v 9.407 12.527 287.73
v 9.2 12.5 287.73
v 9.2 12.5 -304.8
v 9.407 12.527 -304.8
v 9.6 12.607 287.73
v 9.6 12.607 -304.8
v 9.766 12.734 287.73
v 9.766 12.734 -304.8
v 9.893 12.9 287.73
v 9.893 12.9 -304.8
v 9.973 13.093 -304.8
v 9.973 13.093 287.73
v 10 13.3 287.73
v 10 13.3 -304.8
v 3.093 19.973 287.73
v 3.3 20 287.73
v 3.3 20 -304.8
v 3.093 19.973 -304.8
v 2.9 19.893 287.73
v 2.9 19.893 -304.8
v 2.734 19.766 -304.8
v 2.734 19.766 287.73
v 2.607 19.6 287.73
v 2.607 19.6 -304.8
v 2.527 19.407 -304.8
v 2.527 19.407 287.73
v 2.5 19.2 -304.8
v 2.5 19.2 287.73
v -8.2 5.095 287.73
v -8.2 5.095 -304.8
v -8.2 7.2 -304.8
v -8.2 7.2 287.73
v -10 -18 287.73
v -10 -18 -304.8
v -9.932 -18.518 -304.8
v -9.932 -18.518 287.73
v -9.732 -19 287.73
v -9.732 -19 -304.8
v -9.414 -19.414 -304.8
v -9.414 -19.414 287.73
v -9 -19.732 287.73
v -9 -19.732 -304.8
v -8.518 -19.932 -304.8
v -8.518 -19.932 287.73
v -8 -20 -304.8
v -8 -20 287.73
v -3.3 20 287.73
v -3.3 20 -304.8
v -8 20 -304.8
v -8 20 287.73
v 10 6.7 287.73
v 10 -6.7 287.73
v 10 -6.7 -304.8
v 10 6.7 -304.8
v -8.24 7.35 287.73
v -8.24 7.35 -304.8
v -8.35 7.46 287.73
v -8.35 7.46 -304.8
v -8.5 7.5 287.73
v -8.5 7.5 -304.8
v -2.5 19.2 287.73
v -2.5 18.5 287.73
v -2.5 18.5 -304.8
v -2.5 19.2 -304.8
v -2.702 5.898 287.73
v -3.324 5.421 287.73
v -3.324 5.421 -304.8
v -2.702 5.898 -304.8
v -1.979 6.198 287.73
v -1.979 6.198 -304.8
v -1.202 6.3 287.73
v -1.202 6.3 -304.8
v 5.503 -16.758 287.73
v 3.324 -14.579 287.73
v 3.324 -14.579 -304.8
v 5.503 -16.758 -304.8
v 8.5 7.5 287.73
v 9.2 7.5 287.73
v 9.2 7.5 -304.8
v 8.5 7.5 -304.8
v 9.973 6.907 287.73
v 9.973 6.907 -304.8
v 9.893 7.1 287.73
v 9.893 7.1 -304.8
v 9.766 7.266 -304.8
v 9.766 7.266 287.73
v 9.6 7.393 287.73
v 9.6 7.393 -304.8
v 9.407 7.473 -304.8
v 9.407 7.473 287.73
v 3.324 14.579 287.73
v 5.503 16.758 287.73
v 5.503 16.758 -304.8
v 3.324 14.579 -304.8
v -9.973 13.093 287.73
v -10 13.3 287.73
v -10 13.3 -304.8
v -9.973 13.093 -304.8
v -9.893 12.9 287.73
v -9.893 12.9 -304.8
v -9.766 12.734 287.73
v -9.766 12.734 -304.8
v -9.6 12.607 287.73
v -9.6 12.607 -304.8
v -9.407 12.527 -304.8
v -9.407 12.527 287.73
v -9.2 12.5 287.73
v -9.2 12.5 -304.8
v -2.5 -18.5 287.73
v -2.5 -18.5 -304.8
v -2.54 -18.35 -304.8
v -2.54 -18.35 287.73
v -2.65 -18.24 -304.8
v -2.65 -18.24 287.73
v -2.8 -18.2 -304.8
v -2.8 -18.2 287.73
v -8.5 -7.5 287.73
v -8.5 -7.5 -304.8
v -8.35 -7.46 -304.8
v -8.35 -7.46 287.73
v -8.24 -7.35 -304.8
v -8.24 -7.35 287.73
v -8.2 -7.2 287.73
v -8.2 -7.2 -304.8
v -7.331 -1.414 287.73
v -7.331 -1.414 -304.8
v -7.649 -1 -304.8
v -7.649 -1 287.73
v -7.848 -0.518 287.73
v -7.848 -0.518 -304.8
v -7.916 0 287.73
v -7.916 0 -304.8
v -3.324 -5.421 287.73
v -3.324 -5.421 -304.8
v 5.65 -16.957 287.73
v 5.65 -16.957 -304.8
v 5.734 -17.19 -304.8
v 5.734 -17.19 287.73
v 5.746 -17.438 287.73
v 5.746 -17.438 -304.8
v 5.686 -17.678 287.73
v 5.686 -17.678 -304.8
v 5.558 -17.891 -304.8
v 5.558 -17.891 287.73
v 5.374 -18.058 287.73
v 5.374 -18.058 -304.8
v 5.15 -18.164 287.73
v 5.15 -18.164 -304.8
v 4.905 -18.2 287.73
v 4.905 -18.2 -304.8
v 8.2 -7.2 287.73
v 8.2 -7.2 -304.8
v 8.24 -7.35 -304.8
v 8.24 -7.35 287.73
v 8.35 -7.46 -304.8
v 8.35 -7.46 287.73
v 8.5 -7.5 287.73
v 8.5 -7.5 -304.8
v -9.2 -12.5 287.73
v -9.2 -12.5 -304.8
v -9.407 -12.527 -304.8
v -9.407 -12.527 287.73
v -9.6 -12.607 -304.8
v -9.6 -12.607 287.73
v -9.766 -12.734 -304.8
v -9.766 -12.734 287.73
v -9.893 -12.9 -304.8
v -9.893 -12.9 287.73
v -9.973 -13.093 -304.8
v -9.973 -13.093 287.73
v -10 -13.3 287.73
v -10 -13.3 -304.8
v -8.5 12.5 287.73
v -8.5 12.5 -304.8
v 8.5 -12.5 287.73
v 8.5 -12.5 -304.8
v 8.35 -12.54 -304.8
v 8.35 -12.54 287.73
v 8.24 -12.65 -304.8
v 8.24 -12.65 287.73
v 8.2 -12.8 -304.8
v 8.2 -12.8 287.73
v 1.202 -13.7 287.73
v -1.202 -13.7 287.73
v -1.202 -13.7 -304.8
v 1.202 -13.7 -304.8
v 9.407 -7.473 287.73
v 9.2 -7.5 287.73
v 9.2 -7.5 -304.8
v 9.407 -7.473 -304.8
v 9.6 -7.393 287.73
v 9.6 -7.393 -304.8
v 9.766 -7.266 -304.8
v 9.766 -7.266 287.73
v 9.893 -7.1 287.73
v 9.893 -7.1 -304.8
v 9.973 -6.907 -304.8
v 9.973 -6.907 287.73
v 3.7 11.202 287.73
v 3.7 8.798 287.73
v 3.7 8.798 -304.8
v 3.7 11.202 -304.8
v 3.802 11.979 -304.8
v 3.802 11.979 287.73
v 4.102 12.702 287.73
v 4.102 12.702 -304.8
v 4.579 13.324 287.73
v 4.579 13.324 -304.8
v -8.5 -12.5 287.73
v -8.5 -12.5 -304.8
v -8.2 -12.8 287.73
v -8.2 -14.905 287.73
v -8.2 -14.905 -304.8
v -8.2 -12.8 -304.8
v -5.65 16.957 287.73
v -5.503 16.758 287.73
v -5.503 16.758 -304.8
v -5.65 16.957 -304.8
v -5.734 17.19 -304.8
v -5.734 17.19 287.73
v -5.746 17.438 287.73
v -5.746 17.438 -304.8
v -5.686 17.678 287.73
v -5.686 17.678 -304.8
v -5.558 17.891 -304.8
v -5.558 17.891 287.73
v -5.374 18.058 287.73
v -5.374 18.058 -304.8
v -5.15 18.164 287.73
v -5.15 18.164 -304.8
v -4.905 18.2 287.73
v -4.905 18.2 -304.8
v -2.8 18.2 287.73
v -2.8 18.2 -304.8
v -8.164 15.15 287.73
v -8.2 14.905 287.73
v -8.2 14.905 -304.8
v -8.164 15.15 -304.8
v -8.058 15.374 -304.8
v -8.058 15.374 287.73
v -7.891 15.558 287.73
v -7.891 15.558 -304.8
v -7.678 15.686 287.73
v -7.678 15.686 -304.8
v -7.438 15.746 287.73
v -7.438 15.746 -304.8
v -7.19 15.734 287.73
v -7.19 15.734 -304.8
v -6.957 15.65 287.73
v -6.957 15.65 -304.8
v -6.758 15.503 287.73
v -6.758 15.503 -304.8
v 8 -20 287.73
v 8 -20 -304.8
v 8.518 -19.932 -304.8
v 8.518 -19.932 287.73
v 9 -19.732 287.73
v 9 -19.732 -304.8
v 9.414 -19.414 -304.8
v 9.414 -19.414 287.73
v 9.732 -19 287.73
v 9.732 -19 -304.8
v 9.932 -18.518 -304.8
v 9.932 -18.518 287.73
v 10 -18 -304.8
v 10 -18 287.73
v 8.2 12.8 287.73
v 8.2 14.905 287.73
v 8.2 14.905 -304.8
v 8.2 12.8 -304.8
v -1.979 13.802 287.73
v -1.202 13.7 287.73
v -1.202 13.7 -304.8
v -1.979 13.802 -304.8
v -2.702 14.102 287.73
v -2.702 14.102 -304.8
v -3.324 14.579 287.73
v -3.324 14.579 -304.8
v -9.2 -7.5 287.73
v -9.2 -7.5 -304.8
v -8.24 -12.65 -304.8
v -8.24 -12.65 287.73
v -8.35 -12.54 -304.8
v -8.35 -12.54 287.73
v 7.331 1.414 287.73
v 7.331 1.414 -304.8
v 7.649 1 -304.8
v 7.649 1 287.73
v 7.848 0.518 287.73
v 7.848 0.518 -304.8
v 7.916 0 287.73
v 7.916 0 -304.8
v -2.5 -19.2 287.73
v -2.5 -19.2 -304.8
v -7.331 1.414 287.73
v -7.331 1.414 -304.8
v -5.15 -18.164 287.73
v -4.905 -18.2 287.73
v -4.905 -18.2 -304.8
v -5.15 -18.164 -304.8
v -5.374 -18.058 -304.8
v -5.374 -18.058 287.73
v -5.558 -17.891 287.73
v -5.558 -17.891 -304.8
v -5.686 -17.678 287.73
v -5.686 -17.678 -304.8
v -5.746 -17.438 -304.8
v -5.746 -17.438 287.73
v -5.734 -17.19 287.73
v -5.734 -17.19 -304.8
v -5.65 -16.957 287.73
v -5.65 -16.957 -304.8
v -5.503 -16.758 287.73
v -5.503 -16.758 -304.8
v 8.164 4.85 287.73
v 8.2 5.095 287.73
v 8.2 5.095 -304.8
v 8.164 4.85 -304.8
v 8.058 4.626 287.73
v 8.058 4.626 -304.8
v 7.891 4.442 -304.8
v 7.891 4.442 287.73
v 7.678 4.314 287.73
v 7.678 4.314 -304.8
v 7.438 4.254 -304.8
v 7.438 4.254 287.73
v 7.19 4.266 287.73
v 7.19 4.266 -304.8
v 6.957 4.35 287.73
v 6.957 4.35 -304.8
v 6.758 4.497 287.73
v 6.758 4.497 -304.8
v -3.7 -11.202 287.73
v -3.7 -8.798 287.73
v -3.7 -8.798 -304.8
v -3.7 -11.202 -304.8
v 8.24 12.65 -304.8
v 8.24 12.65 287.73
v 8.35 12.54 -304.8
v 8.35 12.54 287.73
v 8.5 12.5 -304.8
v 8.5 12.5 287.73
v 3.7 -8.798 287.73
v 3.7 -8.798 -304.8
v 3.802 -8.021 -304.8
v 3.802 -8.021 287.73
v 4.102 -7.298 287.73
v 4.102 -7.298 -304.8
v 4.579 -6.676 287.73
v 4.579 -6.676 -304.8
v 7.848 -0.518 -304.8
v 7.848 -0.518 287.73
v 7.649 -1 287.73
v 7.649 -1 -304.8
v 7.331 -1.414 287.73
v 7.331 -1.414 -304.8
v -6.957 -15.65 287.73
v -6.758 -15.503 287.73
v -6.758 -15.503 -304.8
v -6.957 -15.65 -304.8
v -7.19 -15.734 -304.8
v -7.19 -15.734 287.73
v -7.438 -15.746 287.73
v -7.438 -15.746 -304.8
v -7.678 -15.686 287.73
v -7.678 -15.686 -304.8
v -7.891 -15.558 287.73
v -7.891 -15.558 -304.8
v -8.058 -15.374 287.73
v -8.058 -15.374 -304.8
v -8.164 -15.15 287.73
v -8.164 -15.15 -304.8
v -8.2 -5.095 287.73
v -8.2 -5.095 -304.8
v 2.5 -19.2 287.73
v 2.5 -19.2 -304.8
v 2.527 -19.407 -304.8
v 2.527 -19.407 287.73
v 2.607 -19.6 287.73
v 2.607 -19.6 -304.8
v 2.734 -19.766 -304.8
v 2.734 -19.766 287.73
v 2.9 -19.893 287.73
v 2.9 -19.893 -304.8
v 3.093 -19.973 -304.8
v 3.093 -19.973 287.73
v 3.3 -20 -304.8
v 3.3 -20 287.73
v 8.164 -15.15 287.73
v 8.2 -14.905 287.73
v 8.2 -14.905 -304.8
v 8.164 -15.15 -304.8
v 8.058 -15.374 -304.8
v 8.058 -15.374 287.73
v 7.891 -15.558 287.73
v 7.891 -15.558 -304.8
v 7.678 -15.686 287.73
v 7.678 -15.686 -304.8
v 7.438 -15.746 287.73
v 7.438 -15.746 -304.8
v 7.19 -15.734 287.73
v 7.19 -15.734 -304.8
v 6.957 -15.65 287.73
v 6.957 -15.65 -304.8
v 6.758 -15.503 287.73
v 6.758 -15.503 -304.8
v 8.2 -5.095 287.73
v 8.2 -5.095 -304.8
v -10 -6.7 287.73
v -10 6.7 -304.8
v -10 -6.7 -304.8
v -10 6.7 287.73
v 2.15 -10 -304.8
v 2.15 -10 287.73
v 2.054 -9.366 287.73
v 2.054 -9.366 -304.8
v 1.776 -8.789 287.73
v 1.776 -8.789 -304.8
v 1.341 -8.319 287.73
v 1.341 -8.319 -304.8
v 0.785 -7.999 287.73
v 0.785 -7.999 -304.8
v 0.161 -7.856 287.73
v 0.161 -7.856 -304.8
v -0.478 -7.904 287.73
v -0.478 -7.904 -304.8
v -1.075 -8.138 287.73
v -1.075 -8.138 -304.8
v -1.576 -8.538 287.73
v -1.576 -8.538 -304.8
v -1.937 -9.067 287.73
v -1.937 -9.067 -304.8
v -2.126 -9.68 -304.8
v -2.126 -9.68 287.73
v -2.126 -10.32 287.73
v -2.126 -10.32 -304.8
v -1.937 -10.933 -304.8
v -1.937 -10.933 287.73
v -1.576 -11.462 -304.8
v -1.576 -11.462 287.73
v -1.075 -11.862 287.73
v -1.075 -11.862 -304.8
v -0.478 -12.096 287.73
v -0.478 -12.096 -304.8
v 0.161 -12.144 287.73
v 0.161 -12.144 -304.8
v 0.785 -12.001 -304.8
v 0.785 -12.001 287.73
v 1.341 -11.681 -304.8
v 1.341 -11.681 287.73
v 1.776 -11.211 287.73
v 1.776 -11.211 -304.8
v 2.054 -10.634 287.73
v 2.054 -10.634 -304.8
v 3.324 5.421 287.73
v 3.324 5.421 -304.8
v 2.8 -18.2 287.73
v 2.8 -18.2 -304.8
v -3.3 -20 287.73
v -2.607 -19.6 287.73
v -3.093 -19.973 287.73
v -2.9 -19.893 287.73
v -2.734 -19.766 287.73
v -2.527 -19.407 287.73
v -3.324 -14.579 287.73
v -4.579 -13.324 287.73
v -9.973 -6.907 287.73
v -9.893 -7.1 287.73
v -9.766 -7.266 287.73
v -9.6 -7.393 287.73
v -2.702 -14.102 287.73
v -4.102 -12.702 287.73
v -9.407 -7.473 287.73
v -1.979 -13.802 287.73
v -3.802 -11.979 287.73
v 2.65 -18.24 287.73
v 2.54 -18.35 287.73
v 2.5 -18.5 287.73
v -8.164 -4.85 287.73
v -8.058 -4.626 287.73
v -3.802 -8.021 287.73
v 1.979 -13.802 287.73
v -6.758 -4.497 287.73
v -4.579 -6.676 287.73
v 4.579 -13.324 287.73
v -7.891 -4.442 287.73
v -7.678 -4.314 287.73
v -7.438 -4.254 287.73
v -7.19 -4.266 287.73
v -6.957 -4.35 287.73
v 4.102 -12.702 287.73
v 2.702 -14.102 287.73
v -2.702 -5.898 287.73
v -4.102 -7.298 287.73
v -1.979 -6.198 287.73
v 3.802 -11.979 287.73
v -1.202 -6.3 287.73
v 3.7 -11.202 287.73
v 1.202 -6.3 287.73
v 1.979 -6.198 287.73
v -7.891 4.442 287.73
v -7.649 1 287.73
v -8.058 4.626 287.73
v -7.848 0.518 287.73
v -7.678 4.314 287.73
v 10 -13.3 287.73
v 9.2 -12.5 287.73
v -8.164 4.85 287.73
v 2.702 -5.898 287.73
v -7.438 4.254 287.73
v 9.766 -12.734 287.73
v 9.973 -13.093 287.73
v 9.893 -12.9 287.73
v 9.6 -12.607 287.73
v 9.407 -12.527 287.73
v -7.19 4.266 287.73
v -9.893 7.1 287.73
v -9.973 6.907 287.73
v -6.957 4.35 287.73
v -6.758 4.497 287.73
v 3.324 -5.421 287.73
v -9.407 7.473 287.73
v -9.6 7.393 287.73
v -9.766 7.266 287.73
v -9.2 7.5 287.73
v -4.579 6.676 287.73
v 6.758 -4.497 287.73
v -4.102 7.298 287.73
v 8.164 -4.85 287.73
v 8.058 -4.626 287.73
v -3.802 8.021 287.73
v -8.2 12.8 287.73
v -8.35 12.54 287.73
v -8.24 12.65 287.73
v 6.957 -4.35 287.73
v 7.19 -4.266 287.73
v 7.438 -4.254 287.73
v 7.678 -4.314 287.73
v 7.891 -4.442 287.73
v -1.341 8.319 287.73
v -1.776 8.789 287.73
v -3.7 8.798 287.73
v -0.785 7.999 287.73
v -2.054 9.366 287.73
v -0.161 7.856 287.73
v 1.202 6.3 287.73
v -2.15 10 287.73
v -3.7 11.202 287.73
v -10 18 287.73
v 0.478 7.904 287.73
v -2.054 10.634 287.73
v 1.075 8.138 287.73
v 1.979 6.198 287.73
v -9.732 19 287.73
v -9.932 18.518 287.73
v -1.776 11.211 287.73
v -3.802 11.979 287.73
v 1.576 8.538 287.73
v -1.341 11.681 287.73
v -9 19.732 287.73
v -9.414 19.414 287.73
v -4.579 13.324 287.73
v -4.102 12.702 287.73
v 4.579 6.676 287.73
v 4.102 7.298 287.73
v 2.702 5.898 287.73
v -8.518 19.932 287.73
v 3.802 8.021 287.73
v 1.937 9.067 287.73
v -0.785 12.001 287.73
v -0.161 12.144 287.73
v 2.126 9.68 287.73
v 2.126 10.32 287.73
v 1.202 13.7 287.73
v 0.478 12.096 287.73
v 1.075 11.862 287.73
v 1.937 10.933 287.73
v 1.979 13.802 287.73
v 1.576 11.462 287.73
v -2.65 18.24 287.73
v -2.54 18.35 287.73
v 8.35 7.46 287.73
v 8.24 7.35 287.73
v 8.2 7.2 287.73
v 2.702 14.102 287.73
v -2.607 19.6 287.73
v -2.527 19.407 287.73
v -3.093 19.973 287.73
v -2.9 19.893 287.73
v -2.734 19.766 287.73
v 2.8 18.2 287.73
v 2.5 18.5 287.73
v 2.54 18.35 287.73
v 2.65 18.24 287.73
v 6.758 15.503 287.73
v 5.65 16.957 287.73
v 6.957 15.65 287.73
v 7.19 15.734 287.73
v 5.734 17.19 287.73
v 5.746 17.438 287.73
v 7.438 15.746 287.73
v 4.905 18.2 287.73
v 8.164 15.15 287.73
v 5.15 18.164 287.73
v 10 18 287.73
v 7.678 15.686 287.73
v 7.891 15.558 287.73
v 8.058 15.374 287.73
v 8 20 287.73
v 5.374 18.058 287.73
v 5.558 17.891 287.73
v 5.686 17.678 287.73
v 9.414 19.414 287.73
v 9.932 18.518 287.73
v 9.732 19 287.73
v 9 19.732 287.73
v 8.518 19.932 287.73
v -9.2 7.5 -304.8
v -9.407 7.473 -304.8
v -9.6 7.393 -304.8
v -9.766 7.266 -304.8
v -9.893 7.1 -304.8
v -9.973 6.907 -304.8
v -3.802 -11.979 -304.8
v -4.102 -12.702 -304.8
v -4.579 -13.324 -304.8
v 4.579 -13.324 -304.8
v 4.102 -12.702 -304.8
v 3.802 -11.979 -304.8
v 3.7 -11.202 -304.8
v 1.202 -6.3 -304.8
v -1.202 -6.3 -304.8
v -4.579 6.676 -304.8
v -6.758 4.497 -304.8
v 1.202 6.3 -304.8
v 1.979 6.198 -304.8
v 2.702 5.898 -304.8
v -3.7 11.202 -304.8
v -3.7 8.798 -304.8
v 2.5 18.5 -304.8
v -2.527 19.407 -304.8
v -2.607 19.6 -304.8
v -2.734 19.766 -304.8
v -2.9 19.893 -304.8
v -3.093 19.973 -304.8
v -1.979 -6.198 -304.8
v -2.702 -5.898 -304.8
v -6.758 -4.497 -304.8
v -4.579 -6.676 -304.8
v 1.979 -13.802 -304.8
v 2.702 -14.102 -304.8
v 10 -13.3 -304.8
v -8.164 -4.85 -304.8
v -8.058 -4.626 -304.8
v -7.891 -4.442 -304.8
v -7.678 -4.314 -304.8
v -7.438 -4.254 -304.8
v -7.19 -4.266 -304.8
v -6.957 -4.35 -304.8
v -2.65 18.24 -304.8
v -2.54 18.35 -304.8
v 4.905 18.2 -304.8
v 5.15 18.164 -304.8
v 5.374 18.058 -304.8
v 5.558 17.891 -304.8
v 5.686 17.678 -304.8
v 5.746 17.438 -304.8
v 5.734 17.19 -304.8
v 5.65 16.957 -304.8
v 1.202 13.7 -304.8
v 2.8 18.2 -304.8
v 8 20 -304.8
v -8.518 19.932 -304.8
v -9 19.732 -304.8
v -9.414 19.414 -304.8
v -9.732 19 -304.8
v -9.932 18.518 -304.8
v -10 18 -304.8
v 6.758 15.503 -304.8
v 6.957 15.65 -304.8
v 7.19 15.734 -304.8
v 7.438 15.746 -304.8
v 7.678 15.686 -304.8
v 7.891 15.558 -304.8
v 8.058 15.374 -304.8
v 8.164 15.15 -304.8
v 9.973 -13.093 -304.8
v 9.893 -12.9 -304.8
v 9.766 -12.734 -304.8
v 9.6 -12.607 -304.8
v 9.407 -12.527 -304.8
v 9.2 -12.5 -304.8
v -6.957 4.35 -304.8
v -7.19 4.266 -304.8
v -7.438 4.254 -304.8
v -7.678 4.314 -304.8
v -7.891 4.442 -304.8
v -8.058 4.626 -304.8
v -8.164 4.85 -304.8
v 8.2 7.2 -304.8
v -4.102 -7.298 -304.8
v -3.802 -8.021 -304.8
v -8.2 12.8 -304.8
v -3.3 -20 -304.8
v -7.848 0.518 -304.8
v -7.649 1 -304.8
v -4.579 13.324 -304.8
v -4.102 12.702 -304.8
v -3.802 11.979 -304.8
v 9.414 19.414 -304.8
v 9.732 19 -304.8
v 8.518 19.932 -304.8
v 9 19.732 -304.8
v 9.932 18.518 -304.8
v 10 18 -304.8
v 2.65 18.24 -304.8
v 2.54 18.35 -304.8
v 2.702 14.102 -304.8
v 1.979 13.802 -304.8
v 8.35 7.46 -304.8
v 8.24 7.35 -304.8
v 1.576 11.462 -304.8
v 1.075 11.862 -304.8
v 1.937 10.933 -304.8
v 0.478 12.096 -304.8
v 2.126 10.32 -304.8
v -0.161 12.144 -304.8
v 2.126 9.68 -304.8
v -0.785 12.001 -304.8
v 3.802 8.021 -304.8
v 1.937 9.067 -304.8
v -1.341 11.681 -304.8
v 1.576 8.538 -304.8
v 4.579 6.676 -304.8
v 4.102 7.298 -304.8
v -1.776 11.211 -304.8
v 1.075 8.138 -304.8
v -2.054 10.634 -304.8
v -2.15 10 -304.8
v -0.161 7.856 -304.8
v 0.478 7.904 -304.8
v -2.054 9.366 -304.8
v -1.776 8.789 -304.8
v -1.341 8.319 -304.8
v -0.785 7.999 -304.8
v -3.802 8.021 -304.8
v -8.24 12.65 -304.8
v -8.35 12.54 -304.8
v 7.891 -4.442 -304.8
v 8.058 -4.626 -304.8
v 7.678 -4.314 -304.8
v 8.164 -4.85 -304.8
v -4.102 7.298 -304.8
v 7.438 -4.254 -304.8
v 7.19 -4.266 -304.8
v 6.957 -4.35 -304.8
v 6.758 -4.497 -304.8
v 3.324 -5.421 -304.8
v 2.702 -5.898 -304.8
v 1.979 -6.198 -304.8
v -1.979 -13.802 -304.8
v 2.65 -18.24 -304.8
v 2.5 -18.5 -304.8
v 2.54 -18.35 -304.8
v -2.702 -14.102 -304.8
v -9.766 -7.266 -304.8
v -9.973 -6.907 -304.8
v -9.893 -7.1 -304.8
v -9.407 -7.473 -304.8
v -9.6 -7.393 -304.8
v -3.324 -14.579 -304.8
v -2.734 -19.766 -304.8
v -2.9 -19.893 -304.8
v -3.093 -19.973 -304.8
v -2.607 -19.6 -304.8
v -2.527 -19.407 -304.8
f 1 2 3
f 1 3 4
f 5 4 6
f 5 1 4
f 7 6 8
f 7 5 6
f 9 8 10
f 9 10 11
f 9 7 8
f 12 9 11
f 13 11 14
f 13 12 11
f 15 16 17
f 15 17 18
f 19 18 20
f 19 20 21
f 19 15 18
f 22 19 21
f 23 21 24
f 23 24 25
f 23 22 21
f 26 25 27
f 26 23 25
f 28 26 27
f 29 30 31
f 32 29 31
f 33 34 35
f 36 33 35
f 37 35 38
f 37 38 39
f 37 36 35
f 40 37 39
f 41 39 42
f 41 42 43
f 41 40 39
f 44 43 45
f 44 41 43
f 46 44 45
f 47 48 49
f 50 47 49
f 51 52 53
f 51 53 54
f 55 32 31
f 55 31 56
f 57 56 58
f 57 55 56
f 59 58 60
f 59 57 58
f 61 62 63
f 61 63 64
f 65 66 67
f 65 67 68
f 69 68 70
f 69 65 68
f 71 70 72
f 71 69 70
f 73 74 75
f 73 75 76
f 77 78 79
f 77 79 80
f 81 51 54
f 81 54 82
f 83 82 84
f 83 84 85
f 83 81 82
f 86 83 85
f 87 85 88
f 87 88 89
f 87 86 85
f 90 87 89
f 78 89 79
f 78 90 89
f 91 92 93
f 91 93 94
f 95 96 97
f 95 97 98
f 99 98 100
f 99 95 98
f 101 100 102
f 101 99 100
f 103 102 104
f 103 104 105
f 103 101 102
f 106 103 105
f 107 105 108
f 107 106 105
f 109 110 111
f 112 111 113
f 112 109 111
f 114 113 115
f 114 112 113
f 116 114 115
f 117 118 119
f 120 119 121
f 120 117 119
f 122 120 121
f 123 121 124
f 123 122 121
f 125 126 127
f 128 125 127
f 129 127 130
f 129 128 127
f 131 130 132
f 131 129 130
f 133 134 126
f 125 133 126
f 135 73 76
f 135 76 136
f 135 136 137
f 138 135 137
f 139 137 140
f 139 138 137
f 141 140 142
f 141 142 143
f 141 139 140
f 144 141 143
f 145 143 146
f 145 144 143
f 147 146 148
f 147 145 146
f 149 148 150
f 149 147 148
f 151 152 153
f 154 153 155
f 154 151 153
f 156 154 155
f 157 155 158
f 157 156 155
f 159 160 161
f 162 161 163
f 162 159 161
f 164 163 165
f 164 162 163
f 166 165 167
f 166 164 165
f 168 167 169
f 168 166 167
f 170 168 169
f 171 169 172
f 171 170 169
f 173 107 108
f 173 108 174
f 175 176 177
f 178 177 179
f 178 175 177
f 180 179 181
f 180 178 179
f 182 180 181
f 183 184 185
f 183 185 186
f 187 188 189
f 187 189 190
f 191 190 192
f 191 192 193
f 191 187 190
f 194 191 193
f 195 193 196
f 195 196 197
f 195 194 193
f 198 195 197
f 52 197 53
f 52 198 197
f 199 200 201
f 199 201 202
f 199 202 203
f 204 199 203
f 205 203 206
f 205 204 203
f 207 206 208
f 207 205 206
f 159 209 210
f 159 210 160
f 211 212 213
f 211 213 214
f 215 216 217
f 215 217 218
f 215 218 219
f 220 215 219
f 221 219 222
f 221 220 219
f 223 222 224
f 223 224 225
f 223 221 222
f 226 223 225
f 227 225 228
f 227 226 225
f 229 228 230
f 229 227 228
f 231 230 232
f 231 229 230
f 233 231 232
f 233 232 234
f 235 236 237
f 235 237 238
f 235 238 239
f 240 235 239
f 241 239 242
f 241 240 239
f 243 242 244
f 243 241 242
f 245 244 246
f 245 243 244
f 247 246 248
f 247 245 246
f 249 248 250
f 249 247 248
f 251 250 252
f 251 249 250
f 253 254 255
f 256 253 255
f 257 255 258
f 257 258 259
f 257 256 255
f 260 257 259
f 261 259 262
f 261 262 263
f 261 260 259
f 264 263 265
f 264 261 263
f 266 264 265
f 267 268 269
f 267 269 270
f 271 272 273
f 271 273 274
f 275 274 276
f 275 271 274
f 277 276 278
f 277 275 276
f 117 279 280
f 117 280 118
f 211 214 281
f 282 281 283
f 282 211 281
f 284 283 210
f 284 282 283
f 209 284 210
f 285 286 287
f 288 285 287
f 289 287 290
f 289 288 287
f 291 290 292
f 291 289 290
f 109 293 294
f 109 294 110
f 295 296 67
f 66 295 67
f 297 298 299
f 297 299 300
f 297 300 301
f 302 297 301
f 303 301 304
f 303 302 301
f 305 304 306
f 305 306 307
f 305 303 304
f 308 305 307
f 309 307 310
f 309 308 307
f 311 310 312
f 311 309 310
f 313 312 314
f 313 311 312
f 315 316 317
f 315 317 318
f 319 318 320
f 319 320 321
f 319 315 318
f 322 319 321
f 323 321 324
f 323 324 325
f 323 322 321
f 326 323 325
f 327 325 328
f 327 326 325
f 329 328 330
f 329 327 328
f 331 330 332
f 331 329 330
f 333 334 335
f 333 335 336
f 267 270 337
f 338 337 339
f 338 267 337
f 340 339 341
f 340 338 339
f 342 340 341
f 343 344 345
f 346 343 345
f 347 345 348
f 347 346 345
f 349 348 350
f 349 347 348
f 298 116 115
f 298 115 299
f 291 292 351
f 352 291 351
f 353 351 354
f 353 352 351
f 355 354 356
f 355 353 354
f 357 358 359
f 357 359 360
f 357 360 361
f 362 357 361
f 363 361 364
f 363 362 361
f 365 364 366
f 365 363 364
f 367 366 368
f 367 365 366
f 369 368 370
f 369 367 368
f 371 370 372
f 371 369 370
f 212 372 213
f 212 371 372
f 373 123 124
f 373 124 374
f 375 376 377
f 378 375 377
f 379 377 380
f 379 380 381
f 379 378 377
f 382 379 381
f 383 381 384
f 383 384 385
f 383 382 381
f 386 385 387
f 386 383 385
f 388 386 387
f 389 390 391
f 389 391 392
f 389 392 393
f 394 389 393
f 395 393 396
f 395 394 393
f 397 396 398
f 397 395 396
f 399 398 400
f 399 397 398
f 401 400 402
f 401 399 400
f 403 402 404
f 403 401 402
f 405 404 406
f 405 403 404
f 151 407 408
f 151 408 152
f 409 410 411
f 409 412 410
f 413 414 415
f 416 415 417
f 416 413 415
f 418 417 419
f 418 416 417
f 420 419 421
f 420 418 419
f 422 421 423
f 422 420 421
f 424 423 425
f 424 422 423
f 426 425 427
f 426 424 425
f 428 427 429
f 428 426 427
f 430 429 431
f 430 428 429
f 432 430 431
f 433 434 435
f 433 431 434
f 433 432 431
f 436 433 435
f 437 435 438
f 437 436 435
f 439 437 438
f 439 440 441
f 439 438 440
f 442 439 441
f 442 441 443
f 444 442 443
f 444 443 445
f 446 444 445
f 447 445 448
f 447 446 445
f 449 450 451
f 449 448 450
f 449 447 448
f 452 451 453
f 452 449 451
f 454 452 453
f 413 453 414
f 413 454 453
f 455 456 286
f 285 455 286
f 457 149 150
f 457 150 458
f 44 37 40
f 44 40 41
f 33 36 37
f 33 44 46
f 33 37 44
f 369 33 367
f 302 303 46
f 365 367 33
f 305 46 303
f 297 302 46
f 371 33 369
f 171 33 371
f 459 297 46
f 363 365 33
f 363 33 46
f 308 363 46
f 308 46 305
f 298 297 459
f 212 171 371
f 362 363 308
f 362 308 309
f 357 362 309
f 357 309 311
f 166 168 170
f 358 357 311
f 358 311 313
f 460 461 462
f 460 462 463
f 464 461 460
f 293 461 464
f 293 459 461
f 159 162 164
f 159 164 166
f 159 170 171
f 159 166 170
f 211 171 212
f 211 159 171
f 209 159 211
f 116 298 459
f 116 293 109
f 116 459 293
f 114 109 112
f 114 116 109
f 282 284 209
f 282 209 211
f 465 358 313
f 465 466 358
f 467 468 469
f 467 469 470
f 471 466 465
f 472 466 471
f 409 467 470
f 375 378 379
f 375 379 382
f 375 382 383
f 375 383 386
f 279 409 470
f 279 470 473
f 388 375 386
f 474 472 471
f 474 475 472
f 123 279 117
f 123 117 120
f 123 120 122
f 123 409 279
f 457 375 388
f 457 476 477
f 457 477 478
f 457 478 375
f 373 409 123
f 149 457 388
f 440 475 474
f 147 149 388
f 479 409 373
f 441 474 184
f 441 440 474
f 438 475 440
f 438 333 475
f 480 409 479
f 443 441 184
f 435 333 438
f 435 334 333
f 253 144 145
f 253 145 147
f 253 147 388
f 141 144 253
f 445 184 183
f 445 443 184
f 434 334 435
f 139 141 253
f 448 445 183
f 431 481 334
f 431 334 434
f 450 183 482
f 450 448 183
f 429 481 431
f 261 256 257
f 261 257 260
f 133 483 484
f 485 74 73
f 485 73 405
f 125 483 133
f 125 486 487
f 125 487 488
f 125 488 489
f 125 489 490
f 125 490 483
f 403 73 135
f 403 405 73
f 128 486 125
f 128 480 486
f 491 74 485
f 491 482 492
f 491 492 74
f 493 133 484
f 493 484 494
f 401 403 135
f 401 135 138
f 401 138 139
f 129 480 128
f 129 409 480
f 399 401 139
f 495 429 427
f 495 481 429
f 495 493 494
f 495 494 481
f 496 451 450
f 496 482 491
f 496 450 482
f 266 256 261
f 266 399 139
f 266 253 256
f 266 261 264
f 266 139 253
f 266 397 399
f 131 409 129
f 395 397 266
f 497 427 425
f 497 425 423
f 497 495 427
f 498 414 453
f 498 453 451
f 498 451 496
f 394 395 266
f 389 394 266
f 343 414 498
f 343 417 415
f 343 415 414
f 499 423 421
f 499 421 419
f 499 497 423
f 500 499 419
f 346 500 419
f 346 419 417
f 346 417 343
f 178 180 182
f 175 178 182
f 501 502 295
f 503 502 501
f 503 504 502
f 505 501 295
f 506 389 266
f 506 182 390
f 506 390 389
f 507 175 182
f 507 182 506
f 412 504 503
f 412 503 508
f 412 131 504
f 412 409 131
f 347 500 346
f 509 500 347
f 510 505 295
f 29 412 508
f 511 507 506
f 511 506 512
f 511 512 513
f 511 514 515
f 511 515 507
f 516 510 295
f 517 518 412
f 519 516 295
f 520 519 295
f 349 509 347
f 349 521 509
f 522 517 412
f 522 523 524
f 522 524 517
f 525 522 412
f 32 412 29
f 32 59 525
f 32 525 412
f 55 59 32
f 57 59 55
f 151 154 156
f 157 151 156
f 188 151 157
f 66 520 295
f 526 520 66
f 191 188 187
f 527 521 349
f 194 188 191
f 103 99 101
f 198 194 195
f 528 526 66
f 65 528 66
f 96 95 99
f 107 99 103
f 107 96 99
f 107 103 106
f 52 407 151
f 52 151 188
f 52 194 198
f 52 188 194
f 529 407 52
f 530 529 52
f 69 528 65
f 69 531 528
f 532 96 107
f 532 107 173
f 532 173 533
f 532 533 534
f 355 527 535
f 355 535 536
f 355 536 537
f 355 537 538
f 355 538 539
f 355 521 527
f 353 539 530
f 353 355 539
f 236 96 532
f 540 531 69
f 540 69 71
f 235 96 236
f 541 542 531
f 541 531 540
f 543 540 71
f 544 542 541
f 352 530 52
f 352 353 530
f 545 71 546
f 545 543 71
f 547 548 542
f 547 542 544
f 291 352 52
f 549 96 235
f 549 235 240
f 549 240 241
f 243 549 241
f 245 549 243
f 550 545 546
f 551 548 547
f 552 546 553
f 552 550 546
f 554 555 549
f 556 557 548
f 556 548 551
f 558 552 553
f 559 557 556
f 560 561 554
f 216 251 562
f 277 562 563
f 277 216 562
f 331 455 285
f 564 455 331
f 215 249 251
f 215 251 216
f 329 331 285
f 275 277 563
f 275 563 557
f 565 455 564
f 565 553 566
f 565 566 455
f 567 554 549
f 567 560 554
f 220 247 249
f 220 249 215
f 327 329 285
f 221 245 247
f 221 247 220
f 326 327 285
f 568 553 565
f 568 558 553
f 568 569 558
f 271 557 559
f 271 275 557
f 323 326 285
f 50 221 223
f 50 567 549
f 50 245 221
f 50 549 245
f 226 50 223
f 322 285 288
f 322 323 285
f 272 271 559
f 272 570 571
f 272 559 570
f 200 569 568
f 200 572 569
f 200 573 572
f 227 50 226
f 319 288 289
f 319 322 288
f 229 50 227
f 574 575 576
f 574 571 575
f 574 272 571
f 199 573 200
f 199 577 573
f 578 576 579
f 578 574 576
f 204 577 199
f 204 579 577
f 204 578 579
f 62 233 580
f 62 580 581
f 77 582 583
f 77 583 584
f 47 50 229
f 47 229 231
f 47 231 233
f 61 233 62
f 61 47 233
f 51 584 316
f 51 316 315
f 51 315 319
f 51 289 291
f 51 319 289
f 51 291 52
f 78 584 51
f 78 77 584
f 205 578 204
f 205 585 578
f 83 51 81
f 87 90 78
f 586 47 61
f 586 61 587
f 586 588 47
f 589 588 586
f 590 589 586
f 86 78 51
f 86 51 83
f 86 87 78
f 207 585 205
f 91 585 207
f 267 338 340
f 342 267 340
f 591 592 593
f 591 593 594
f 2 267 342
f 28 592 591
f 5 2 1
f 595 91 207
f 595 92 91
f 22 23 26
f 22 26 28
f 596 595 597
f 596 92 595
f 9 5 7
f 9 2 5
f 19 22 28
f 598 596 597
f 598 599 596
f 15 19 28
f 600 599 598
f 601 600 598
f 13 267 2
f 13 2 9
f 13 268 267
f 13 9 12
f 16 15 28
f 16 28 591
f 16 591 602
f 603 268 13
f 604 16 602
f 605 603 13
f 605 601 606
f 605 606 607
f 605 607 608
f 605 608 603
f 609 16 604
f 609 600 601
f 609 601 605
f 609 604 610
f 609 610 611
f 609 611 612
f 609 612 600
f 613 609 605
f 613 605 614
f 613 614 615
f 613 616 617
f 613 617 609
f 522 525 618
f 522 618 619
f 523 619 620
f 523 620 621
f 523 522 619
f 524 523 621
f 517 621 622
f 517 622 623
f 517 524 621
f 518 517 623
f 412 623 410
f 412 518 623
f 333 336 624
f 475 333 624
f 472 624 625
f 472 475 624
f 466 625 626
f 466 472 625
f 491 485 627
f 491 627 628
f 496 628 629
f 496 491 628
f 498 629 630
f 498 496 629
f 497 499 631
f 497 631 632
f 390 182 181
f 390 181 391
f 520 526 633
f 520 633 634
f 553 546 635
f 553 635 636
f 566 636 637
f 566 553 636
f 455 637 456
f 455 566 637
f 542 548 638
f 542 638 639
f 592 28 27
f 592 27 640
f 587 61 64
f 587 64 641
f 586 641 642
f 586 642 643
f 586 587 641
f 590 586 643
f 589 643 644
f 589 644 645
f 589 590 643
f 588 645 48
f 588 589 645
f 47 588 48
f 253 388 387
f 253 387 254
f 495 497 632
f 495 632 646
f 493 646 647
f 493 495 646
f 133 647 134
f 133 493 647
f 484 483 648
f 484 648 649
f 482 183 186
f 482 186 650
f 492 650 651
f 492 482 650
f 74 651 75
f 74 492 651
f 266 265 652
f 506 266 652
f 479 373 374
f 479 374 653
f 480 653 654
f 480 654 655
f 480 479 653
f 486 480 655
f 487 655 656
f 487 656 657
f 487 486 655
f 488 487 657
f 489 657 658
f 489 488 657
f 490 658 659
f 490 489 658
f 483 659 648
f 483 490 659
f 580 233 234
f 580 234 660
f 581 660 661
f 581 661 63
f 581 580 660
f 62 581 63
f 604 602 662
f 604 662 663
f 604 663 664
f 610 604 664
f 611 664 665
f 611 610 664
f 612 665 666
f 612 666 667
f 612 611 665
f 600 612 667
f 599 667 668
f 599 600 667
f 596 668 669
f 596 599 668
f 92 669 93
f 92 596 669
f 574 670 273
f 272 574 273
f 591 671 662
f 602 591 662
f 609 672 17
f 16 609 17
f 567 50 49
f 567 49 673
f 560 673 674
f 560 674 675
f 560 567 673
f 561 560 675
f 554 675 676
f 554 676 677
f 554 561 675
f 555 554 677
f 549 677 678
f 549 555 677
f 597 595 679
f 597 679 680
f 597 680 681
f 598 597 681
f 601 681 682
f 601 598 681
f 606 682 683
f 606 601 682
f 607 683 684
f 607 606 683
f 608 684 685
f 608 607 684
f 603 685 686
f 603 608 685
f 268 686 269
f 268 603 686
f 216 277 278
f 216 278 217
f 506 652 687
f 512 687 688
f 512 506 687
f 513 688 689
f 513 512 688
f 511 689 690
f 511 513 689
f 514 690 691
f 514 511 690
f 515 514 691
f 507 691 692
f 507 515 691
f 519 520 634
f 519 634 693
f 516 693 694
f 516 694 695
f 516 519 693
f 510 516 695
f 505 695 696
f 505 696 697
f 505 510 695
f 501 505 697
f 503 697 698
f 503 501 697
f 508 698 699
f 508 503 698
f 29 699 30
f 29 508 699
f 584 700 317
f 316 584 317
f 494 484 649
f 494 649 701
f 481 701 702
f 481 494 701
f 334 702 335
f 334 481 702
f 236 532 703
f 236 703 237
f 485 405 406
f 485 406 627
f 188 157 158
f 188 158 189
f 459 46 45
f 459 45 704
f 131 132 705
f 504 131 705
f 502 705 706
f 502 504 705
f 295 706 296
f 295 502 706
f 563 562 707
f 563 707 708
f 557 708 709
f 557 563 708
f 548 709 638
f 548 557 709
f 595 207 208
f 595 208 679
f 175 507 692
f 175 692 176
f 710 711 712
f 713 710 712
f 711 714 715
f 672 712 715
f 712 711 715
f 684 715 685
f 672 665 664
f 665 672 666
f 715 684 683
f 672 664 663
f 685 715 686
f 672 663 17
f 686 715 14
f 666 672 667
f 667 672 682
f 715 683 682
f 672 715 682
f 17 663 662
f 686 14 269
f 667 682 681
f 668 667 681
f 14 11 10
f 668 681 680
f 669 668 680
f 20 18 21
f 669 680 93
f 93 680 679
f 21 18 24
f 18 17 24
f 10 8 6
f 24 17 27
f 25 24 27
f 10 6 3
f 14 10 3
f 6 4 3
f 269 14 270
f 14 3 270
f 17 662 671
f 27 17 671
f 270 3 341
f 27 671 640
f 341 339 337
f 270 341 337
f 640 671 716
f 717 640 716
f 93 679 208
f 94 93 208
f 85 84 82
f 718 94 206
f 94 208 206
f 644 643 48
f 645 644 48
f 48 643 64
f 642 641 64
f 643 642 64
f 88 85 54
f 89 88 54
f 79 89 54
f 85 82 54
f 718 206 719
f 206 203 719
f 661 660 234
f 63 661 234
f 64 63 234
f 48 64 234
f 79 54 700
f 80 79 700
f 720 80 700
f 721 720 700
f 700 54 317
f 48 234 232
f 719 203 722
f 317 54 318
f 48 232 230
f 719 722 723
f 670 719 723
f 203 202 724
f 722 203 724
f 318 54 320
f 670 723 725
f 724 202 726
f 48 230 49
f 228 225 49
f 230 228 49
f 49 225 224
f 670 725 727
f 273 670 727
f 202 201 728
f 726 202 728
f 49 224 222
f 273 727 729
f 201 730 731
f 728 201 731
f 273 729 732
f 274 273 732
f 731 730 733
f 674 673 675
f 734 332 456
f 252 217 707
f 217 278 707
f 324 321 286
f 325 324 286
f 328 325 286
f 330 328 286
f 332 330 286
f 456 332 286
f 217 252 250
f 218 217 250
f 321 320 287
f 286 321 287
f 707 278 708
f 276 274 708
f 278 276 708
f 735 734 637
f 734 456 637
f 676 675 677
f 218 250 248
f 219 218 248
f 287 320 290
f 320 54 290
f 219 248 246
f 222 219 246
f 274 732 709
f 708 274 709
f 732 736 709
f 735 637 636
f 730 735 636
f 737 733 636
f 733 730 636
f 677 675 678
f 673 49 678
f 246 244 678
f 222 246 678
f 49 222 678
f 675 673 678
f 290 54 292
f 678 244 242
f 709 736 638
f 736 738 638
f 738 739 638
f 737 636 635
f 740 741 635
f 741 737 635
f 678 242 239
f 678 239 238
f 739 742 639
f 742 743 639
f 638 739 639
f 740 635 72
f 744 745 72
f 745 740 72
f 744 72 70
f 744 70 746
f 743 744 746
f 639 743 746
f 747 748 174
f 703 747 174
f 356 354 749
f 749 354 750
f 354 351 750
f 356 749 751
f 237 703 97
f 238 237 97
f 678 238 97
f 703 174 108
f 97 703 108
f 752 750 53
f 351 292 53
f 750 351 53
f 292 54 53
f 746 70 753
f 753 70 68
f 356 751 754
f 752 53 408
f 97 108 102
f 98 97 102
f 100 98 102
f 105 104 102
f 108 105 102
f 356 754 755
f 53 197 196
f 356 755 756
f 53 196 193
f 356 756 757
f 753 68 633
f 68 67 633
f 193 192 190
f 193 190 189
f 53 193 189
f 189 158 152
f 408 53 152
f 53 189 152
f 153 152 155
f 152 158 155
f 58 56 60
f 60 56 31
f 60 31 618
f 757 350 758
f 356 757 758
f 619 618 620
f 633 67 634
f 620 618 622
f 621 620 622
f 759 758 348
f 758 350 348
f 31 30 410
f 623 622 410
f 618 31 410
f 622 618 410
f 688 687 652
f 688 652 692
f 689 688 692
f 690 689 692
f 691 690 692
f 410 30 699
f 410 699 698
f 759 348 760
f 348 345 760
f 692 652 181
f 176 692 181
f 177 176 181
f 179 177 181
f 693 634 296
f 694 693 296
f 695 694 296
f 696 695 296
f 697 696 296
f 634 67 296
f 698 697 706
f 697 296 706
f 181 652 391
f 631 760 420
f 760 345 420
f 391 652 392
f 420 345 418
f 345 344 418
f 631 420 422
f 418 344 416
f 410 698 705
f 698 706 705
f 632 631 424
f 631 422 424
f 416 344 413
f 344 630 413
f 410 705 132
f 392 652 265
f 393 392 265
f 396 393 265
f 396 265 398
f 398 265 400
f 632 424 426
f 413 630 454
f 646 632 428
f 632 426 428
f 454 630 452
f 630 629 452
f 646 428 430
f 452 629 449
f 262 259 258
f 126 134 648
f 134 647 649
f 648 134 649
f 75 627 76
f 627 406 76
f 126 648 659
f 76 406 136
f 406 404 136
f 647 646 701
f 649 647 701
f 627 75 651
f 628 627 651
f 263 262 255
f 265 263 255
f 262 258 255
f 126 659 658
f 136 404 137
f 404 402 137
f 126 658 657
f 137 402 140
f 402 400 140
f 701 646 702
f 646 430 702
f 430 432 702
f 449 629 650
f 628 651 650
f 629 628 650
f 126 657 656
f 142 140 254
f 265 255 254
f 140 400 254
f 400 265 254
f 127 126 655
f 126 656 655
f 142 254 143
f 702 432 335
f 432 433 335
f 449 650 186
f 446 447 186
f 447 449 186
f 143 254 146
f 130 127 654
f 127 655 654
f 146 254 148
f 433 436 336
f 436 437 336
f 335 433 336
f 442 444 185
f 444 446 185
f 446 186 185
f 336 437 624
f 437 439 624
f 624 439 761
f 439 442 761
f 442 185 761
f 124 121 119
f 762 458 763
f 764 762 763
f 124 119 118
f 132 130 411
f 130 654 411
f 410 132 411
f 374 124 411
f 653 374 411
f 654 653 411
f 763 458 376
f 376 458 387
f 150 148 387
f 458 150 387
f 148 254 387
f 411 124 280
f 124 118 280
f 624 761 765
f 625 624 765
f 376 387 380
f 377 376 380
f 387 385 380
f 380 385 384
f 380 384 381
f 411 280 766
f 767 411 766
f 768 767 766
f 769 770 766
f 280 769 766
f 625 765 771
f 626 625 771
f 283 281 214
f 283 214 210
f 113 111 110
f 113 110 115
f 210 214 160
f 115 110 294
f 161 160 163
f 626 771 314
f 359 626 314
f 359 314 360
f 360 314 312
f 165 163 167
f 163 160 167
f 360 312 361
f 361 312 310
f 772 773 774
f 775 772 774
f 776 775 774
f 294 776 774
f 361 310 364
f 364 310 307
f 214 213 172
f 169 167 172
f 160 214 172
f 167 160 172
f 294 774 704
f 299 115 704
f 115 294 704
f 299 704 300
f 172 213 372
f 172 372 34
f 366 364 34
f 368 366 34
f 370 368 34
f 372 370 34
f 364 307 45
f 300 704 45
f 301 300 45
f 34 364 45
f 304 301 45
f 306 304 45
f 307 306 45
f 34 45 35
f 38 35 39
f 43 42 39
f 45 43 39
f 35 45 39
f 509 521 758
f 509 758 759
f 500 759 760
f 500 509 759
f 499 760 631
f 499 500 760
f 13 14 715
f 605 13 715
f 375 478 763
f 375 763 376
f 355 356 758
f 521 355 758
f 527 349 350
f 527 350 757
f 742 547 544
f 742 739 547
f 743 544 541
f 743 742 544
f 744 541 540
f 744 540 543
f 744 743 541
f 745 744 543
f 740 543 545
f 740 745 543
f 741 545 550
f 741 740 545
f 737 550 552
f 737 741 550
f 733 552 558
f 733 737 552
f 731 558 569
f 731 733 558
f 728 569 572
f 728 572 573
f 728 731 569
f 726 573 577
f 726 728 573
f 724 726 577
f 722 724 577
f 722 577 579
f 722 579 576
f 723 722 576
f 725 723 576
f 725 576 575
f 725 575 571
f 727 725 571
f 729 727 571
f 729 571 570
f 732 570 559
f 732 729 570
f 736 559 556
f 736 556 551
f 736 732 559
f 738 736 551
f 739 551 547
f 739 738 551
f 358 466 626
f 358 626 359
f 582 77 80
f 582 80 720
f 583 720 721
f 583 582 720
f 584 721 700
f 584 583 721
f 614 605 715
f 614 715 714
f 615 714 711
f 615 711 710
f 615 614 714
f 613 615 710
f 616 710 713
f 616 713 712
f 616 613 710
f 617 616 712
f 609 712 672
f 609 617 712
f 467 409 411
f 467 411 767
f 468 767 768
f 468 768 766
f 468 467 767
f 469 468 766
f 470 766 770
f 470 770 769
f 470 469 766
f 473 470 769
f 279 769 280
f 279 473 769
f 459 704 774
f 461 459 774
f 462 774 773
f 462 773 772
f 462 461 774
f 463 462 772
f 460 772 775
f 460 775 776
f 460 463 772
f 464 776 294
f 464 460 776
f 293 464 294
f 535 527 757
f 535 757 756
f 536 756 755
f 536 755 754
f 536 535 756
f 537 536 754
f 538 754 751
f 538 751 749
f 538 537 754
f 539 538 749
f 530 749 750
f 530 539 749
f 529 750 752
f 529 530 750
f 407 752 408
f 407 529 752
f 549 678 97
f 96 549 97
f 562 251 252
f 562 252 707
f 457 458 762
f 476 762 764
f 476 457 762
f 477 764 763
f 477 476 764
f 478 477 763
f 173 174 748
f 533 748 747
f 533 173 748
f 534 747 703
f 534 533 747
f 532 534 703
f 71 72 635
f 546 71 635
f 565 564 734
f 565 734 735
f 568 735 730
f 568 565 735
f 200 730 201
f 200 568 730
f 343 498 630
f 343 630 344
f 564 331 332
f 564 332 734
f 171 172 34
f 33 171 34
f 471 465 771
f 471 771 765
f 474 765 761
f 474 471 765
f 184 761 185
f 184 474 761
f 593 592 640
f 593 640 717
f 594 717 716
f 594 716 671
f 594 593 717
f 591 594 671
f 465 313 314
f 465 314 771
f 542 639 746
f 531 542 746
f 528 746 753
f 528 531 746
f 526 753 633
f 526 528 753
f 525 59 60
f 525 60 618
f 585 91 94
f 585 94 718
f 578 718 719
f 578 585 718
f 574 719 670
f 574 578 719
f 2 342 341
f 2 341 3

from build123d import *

# Parameters (mm, degrees)
SKETCH3_R           = 2.15
BOSS_EXTRUDE1_DEPTH = 304.8
CIRPATTERN1_COUNT   = 2
SKETCH4_R           = 2.15
CUT_EXTRUDE1_DEPTH  = 17.07


with BuildPart() as part:
    # Sketch3 → Boss-Extrude1 (new, symmetric)
    with BuildSketch(Plane.XY):
        with BuildLine():
            Line((-8.5, 7.5), (-9.2, 7.5))
            ThreePointArc((-9.2, 7.5), (-9.765685425, 7.265685425), (-10, 6.7))
            Line((-10, 6.7), (-10, 0))
            Line((-10, 0), (-7.916458339, 0))
            ThreePointArc((-7.916458339, 0), (-7.764217404, 0.765366865), (-7.330671901, 1.414213562))
            Line((-7.330671901, 1.414213562), (-3.32356512, 5.421320344))
            ThreePointArc((-3.32356512, 5.421320344), (-2.350295073, 6.071638598), (-1.202244776, 6.3))
            Line((-1.202244776, 6.3), (1.202244776, 6.3))
            ThreePointArc((1.202244776, 6.3), (2.350295073, 6.071638598), (3.32356512, 5.421320344))
            Line((3.32356512, 5.421320344), (7.330671901, 1.414213562))
            ThreePointArc((7.330671901, 1.414213562), (7.764217404, 0.765366865), (7.916458339, 0))
            Line((7.916458339, 0), (10, 0))
            Line((10, 0), (10, 6.7))
            ThreePointArc((10, 6.7), (9.765685425, 7.265685425), (9.2, 7.5))
            Line((9.2, 7.5), (8.5, 7.5))
            ThreePointArc((8.5, 7.5), (8.287867966, 7.412132034), (8.2, 7.2))
            Line((8.2, 7.2), (8.2, 5.094911614))
            ThreePointArc((8.2, 5.094911614), (7.678422063, 4.314315067), (6.757645654, 4.497468882))
            Line((6.757645654, 4.497468882), (4.578679656, 6.67643488))
            ThreePointArc((4.578679656, 6.67643488), (3.928361402, 7.649704927), (3.7, 8.797755224))
            Line((3.7, 8.797755224), (3.7, 11.202244776))
            ThreePointArc((3.7, 11.202244776), (3.928361402, 12.350295073), (4.578679656, 13.32356512))
            Line((4.578679656, 13.32356512), (6.757645654, 15.502531118))
            ThreePointArc((6.757645654, 15.502531118), (7.678422063, 15.685684933), (8.2, 14.905088386))
            Line((8.2, 14.905088386), (8.2, 12.8))
            ThreePointArc((8.2, 12.8), (8.287867966, 12.587867966), (8.5, 12.5))
            Line((8.5, 12.5), (9.2, 12.5))
            ThreePointArc((9.2, 12.5), (9.765685425, 12.734314575), (10, 13.3))
            Line((10, 13.3), (10, 18))
            ThreePointArc((10, 18), (9.414213562, 19.414213562), (8, 20))
            Line((8, 20), (3.3, 20))
            ThreePointArc((3.3, 20), (2.734314575, 19.765685425), (2.5, 19.2))
            Line((2.5, 19.2), (2.5, 18.5))
            ThreePointArc((2.5, 18.5), (2.587867966, 18.287867966), (2.8, 18.2))
            Line((2.8, 18.2), (4.905088386, 18.2))
            ThreePointArc((4.905088386, 18.2), (5.685684933, 17.678422063), (5.502531118, 16.757645654))
            Line((5.502531118, 16.757645654), (3.32356512, 14.578679656))
            ThreePointArc((3.32356512, 14.578679656), (2.350295073, 13.928361402), (1.202244776, 13.7))
            Line((1.202244776, 13.7), (-1.202244776, 13.7))
            ThreePointArc((-1.202244776, 13.7), (-2.350295073, 13.928361402), (-3.32356512, 14.578679656))
            Line((-3.32356512, 14.578679656), (-5.502531118, 16.757645654))
            ThreePointArc((-5.502531118, 16.757645654), (-5.685684933, 17.678422063), (-4.905088386, 18.2))
            Line((-4.905088386, 18.2), (-2.8, 18.2))
            ThreePointArc((-2.8, 18.2), (-2.587867966, 18.287867966), (-2.5, 18.5))
            Line((-2.5, 18.5), (-2.5, 19.2))
            ThreePointArc((-2.5, 19.2), (-2.734314575, 19.765685425), (-3.3, 20))
            Line((-3.3, 20), (-8, 20))
            ThreePointArc((-8, 20), (-9.414213562, 19.414213562), (-10, 18))
            Line((-10, 18), (-10, 13.3))
            ThreePointArc((-10, 13.3), (-9.765685425, 12.734314575), (-9.2, 12.5))
            Line((-9.2, 12.5), (-8.5, 12.5))
            ThreePointArc((-8.5, 12.5), (-8.287867966, 12.587867966), (-8.2, 12.8))
            Line((-8.2, 12.8), (-8.2, 14.905088386))
            ThreePointArc((-8.2, 14.905088386), (-7.678422063, 15.685684933), (-6.757645654, 15.502531118))
            Line((-6.757645654, 15.502531118), (-4.578679656, 13.32356512))
            ThreePointArc((-4.578679656, 13.32356512), (-3.928361402, 12.350295073), (-3.7, 11.202244776))
            Line((-3.7, 11.202244776), (-3.7, 8.797755224))
            ThreePointArc((-3.7, 8.797755224), (-3.928361402, 7.649704927), (-4.578679656, 6.67643488))
            Line((-4.578679656, 6.67643488), (-6.757645654, 4.497468882))
            ThreePointArc((-6.757645654, 4.497468882), (-7.678422063, 4.314315067), (-8.2, 5.094911614))
            Line((-8.2, 5.094911614), (-8.2, 7.2))
            ThreePointArc((-8.2, 7.2), (-8.287867966, 7.412132034), (-8.5, 7.5))
        make_face()
        with Locations(Location((0, 10, 0), (0, 0, 180))):
            Circle(SKETCH3_R, mode=Mode.SUBTRACT)
    boss_extrude1 = extrude(amount=BOSS_EXTRUDE1_DEPTH, both=True)

    # CirPattern1: Boss-Extrude1 ×2 about axis
    cirpattern1_axis = Axis((0, 0, 0), (0, 0, 1))
    for i in range(1, CIRPATTERN1_COUNT):
        add(boss_extrude1.rotate(cirpattern1_axis, i * 360 / CIRPATTERN1_COUNT))

    # Sketch4 → Cut-Extrude1 (cut)
    with BuildSketch(Plane.XY.offset(304.8)):
        with BuildLine():
            Line((-2.5, 18.5), (-2.5, 19.2))
            ThreePointArc((-2.5, 19.2), (-2.734314575, 19.765685425), (-3.3, 20))
            Line((-3.3, 20), (-8, 20))
            ThreePointArc((-8, 20), (-9.414213562, 19.414213562), (-10, 18))
            Line((-10, 18), (-10, 13.3))
            ThreePointArc((-10, 13.3), (-9.765685425, 12.734314575), (-9.2, 12.5))
            Line((-9.2, 12.5), (-8.5, 12.5))
            ThreePointArc((-8.5, 12.5), (-8.287867966, 12.587867966), (-8.2, 12.8))
            Line((-8.2, 12.8), (-8.2, 14.905088386))
            ThreePointArc((-8.2, 14.905088386), (-7.678422063, 15.685684933), (-6.757645654, 15.502531118))
            Line((-6.757645654, 15.502531118), (-4.578679656, 13.32356512))
            ThreePointArc((-4.578679656, 13.32356512), (-3.928361402, 12.350295073), (-3.7, 11.202244776))
            Line((-3.7, 11.202244776), (-3.7, 8.797755224))
            ThreePointArc((-3.7, 8.797755224), (-3.928361402, 7.649704927), (-4.578679656, 6.67643488))
            Line((-4.578679656, 6.67643488), (-6.757645654, 4.497468882))
            ThreePointArc((-6.757645654, 4.497468882), (-7.678422063, 4.314315067), (-8.2, 5.094911614))
            Line((-8.2, 5.094911614), (-8.2, 7.2))
            ThreePointArc((-8.2, 7.2), (-8.287867966, 7.412132034), (-8.5, 7.5))
            Line((-8.5, 7.5), (-9.2, 7.5))
            ThreePointArc((-9.2, 7.5), (-9.765685425, 7.265685425), (-10, 6.7))
            Line((-10, 6.7), (-10, -6.7))
            ThreePointArc((-10, -6.7), (-9.765685425, -7.265685425), (-9.2, -7.5))
            Line((-9.2, -7.5), (-8.5, -7.5))
            ThreePointArc((-8.5, -7.5), (-8.287867966, -7.412132034), (-8.2, -7.2))
            Line((-8.2, -7.2), (-8.2, -5.094911614))
            ThreePointArc((-8.2, -5.094911614), (-7.678422063, -4.314315067), (-6.757645654, -4.497468882))
            Line((-6.757645654, -4.497468882), (-4.578679656, -6.67643488))
            ThreePointArc((-4.578679656, -6.67643488), (-3.928361402, -7.649704927), (-3.7, -8.797755224))
            Line((-3.7, -8.797755224), (-3.7, -11.202244776))
            ThreePointArc((-3.7, -11.202244776), (-3.928361402, -12.350295073), (-4.578679656, -13.32356512))
            Line((-4.578679656, -13.32356512), (-6.757645654, -15.502531118))
            ThreePointArc((-6.757645654, -15.502531118), (-7.678422063, -15.685684933), (-8.2, -14.905088386))
            Line((-8.2, -14.905088386), (-8.2, -12.8))
            ThreePointArc((-8.2, -12.8), (-8.287867966, -12.587867966), (-8.5, -12.5))
            Line((-8.5, -12.5), (-9.2, -12.5))
            ThreePointArc((-9.2, -12.5), (-9.765685425, -12.734314575), (-10, -13.3))
            Line((-10, -13.3), (-10, -18))
            ThreePointArc((-10, -18), (-9.414213562, -19.414213562), (-8, -20))
            Line((-8, -20), (-3.3, -20))
            ThreePointArc((-3.3, -20), (-2.734314575, -19.765685425), (-2.5, -19.2))
            Line((-2.5, -19.2), (-2.5, -18.5))
            ThreePointArc((-2.5, -18.5), (-2.587867966, -18.287867966), (-2.8, -18.2))
            Line((-2.8, -18.2), (-4.905088386, -18.2))
            ThreePointArc((-4.905088386, -18.2), (-5.685684933, -17.678422063), (-5.502531118, -16.757645654))
            Line((-5.502531118, -16.757645654), (-3.32356512, -14.578679656))
            ThreePointArc((-3.32356512, -14.578679656), (-2.350295073, -13.928361402), (-1.202244776, -13.7))
            Line((-1.202244776, -13.7), (1.202244776, -13.7))
            ThreePointArc((1.202244776, -13.7), (2.350295073, -13.928361402), (3.32356512, -14.578679656))
            Line((3.32356512, -14.578679656), (5.502531118, -16.757645654))
            ThreePointArc((5.502531118, -16.757645654), (5.685684933, -17.678422063), (4.905088386, -18.2))
            Line((4.905088386, -18.2), (2.8, -18.2))
            ThreePointArc((2.8, -18.2), (2.587867966, -18.287867966), (2.5, -18.5))
            Line((2.5, -18.5), (2.5, -19.2))
            ThreePointArc((2.5, -19.2), (2.734314575, -19.765685425), (3.3, -20))
            Line((3.3, -20), (8, -20))
            ThreePointArc((8, -20), (9.414213562, -19.414213562), (10, -18))
            Line((10, -18), (10, -13.3))
            ThreePointArc((10, -13.3), (9.765685425, -12.734314575), (9.2, -12.5))
            Line((9.2, -12.5), (8.5, -12.5))
            ThreePointArc((8.5, -12.5), (8.287867966, -12.587867966), (8.2, -12.8))
            Line((8.2, -12.8), (8.2, -14.905088386))
            ThreePointArc((8.2, -14.905088386), (7.678422063, -15.685684933), (6.757645654, -15.502531118))
            Line((6.757645654, -15.502531118), (4.578679656, -13.32356512))
            ThreePointArc((4.578679656, -13.32356512), (3.928361402, -12.350295073), (3.7, -11.202244776))
            Line((3.7, -11.202244776), (3.7, -8.797755224))
            ThreePointArc((3.7, -8.797755224), (3.928361402, -7.649704927), (4.578679656, -6.67643488))
            Line((4.578679656, -6.67643488), (6.757645654, -4.497468882))
            ThreePointArc((6.757645654, -4.497468882), (7.678422063, -4.314315067), (8.2, -5.094911614))
            Line((8.2, -5.094911614), (8.2, -7.2))
            ThreePointArc((8.2, -7.2), (8.287867966, -7.412132034), (8.5, -7.5))
            Line((8.5, -7.5), (9.2, -7.5))
            ThreePointArc((9.2, -7.5), (9.765685425, -7.265685425), (10, -6.7))
            Line((10, -6.7), (10, 6.7))
            ThreePointArc((10, 6.7), (9.765685425, 7.265685425), (9.2, 7.5))
            Line((9.2, 7.5), (8.5, 7.5))
            ThreePointArc((8.5, 7.5), (8.287867966, 7.412132034), (8.2, 7.2))
            Line((8.2, 7.2), (8.2, 5.094911614))
            ThreePointArc((8.2, 5.094911614), (7.678422063, 4.314315067), (6.757645654, 4.497468882))
            Line((6.757645654, 4.497468882), (4.578679656, 6.67643488))
            ThreePointArc((4.578679656, 6.67643488), (3.928361402, 7.649704927), (3.7, 8.797755224))
            Line((3.7, 8.797755224), (3.7, 11.202244776))
            ThreePointArc((3.7, 11.202244776), (3.928361402, 12.350295073), (4.578679656, 13.32356512))
            Line((4.578679656, 13.32356512), (6.757645654, 15.502531118))
            ThreePointArc((6.757645654, 15.502531118), (7.678422063, 15.685684933), (8.2, 14.905088386))
            Line((8.2, 14.905088386), (8.2, 12.8))
            ThreePointArc((8.2, 12.8), (8.287867966, 12.587867966), (8.5, 12.5))
            Line((8.5, 12.5), (9.2, 12.5))
            ThreePointArc((9.2, 12.5), (9.765685425, 12.734314575), (10, 13.3))
            Line((10, 13.3), (10, 18))
            ThreePointArc((10, 18), (9.414213562, 19.414213562), (8, 20))
            Line((8, 20), (3.3, 20))
            ThreePointArc((3.3, 20), (2.734314575, 19.765685425), (2.5, 19.2))
            Line((2.5, 19.2), (2.5, 18.5))
            ThreePointArc((2.5, 18.5), (2.587867966, 18.287867966), (2.8, 18.2))
            Line((2.8, 18.2), (4.905088386, 18.2))
            ThreePointArc((4.905088386, 18.2), (5.685684933, 17.678422063), (5.502531118, 16.757645654))
            Line((5.502531118, 16.757645654), (3.32356512, 14.578679656))
            ThreePointArc((3.32356512, 14.578679656), (2.350295073, 13.928361402), (1.202244776, 13.7))
            Line((1.202244776, 13.7), (-1.202244776, 13.7))
            ThreePointArc((-1.202244776, 13.7), (-2.350295073, 13.928361402), (-3.32356512, 14.578679656))
            Line((-3.32356512, 14.578679656), (-5.502531118, 16.757645654))
            ThreePointArc((-5.502531118, 16.757645654), (-5.685684933, 17.678422063), (-4.905088386, 18.2))
            Line((-4.905088386, 18.2), (-2.8, 18.2))
            ThreePointArc((-2.8, 18.2), (-2.587867966, 18.287867966), (-2.5, 18.5))
        make_face()
        with Locations(Location((0, 10, 0), (0, 0, 180))):
            Circle(SKETCH4_R, mode=Mode.SUBTRACT)
        with Locations(Location((0, -10, 0), (0, 0, 90))):
            Circle(SKETCH4_R, mode=Mode.SUBTRACT)
        with BuildLine():
            Line((7.330671901, -1.414213562), (3.32356512, -5.421320344))
            ThreePointArc((3.32356512, -5.421320344), (2.350295073, -6.071638598), (1.202244776, -6.3))
            Line((1.202244776, -6.3), (-1.202244776, -6.3))
            ThreePointArc((-1.202244776, -6.3), (-2.350295073, -6.071638598), (-3.32356512, -5.421320344))
            Line((-3.32356512, -5.421320344), (-7.330671901, -1.414213562))
            ThreePointArc((-7.330671901, -1.414213562), (-7.916458339, 0), (-7.330671901, 1.414213562))
            Line((-7.330671901, 1.414213562), (-3.32356512, 5.421320344))
            ThreePointArc((-3.32356512, 5.421320344), (-2.350295073, 6.071638598), (-1.202244776, 6.3))
            Line((-1.202244776, 6.3), (1.202244776, 6.3))
            ThreePointArc((1.202244776, 6.3), (2.350295073, 6.071638598), (3.32356512, 5.421320344))
            Line((3.32356512, 5.421320344), (7.330671901, 1.414213562))
            ThreePointArc((7.330671901, 1.414213562), (7.916458339, 0), (7.330671901, -1.414213562))
        make_face(mode=Mode.SUBTRACT)
    extrude(amount=-CUT_EXTRUDE1_DEPTH, mode=Mode.SUBTRACT)


solid = part.part
